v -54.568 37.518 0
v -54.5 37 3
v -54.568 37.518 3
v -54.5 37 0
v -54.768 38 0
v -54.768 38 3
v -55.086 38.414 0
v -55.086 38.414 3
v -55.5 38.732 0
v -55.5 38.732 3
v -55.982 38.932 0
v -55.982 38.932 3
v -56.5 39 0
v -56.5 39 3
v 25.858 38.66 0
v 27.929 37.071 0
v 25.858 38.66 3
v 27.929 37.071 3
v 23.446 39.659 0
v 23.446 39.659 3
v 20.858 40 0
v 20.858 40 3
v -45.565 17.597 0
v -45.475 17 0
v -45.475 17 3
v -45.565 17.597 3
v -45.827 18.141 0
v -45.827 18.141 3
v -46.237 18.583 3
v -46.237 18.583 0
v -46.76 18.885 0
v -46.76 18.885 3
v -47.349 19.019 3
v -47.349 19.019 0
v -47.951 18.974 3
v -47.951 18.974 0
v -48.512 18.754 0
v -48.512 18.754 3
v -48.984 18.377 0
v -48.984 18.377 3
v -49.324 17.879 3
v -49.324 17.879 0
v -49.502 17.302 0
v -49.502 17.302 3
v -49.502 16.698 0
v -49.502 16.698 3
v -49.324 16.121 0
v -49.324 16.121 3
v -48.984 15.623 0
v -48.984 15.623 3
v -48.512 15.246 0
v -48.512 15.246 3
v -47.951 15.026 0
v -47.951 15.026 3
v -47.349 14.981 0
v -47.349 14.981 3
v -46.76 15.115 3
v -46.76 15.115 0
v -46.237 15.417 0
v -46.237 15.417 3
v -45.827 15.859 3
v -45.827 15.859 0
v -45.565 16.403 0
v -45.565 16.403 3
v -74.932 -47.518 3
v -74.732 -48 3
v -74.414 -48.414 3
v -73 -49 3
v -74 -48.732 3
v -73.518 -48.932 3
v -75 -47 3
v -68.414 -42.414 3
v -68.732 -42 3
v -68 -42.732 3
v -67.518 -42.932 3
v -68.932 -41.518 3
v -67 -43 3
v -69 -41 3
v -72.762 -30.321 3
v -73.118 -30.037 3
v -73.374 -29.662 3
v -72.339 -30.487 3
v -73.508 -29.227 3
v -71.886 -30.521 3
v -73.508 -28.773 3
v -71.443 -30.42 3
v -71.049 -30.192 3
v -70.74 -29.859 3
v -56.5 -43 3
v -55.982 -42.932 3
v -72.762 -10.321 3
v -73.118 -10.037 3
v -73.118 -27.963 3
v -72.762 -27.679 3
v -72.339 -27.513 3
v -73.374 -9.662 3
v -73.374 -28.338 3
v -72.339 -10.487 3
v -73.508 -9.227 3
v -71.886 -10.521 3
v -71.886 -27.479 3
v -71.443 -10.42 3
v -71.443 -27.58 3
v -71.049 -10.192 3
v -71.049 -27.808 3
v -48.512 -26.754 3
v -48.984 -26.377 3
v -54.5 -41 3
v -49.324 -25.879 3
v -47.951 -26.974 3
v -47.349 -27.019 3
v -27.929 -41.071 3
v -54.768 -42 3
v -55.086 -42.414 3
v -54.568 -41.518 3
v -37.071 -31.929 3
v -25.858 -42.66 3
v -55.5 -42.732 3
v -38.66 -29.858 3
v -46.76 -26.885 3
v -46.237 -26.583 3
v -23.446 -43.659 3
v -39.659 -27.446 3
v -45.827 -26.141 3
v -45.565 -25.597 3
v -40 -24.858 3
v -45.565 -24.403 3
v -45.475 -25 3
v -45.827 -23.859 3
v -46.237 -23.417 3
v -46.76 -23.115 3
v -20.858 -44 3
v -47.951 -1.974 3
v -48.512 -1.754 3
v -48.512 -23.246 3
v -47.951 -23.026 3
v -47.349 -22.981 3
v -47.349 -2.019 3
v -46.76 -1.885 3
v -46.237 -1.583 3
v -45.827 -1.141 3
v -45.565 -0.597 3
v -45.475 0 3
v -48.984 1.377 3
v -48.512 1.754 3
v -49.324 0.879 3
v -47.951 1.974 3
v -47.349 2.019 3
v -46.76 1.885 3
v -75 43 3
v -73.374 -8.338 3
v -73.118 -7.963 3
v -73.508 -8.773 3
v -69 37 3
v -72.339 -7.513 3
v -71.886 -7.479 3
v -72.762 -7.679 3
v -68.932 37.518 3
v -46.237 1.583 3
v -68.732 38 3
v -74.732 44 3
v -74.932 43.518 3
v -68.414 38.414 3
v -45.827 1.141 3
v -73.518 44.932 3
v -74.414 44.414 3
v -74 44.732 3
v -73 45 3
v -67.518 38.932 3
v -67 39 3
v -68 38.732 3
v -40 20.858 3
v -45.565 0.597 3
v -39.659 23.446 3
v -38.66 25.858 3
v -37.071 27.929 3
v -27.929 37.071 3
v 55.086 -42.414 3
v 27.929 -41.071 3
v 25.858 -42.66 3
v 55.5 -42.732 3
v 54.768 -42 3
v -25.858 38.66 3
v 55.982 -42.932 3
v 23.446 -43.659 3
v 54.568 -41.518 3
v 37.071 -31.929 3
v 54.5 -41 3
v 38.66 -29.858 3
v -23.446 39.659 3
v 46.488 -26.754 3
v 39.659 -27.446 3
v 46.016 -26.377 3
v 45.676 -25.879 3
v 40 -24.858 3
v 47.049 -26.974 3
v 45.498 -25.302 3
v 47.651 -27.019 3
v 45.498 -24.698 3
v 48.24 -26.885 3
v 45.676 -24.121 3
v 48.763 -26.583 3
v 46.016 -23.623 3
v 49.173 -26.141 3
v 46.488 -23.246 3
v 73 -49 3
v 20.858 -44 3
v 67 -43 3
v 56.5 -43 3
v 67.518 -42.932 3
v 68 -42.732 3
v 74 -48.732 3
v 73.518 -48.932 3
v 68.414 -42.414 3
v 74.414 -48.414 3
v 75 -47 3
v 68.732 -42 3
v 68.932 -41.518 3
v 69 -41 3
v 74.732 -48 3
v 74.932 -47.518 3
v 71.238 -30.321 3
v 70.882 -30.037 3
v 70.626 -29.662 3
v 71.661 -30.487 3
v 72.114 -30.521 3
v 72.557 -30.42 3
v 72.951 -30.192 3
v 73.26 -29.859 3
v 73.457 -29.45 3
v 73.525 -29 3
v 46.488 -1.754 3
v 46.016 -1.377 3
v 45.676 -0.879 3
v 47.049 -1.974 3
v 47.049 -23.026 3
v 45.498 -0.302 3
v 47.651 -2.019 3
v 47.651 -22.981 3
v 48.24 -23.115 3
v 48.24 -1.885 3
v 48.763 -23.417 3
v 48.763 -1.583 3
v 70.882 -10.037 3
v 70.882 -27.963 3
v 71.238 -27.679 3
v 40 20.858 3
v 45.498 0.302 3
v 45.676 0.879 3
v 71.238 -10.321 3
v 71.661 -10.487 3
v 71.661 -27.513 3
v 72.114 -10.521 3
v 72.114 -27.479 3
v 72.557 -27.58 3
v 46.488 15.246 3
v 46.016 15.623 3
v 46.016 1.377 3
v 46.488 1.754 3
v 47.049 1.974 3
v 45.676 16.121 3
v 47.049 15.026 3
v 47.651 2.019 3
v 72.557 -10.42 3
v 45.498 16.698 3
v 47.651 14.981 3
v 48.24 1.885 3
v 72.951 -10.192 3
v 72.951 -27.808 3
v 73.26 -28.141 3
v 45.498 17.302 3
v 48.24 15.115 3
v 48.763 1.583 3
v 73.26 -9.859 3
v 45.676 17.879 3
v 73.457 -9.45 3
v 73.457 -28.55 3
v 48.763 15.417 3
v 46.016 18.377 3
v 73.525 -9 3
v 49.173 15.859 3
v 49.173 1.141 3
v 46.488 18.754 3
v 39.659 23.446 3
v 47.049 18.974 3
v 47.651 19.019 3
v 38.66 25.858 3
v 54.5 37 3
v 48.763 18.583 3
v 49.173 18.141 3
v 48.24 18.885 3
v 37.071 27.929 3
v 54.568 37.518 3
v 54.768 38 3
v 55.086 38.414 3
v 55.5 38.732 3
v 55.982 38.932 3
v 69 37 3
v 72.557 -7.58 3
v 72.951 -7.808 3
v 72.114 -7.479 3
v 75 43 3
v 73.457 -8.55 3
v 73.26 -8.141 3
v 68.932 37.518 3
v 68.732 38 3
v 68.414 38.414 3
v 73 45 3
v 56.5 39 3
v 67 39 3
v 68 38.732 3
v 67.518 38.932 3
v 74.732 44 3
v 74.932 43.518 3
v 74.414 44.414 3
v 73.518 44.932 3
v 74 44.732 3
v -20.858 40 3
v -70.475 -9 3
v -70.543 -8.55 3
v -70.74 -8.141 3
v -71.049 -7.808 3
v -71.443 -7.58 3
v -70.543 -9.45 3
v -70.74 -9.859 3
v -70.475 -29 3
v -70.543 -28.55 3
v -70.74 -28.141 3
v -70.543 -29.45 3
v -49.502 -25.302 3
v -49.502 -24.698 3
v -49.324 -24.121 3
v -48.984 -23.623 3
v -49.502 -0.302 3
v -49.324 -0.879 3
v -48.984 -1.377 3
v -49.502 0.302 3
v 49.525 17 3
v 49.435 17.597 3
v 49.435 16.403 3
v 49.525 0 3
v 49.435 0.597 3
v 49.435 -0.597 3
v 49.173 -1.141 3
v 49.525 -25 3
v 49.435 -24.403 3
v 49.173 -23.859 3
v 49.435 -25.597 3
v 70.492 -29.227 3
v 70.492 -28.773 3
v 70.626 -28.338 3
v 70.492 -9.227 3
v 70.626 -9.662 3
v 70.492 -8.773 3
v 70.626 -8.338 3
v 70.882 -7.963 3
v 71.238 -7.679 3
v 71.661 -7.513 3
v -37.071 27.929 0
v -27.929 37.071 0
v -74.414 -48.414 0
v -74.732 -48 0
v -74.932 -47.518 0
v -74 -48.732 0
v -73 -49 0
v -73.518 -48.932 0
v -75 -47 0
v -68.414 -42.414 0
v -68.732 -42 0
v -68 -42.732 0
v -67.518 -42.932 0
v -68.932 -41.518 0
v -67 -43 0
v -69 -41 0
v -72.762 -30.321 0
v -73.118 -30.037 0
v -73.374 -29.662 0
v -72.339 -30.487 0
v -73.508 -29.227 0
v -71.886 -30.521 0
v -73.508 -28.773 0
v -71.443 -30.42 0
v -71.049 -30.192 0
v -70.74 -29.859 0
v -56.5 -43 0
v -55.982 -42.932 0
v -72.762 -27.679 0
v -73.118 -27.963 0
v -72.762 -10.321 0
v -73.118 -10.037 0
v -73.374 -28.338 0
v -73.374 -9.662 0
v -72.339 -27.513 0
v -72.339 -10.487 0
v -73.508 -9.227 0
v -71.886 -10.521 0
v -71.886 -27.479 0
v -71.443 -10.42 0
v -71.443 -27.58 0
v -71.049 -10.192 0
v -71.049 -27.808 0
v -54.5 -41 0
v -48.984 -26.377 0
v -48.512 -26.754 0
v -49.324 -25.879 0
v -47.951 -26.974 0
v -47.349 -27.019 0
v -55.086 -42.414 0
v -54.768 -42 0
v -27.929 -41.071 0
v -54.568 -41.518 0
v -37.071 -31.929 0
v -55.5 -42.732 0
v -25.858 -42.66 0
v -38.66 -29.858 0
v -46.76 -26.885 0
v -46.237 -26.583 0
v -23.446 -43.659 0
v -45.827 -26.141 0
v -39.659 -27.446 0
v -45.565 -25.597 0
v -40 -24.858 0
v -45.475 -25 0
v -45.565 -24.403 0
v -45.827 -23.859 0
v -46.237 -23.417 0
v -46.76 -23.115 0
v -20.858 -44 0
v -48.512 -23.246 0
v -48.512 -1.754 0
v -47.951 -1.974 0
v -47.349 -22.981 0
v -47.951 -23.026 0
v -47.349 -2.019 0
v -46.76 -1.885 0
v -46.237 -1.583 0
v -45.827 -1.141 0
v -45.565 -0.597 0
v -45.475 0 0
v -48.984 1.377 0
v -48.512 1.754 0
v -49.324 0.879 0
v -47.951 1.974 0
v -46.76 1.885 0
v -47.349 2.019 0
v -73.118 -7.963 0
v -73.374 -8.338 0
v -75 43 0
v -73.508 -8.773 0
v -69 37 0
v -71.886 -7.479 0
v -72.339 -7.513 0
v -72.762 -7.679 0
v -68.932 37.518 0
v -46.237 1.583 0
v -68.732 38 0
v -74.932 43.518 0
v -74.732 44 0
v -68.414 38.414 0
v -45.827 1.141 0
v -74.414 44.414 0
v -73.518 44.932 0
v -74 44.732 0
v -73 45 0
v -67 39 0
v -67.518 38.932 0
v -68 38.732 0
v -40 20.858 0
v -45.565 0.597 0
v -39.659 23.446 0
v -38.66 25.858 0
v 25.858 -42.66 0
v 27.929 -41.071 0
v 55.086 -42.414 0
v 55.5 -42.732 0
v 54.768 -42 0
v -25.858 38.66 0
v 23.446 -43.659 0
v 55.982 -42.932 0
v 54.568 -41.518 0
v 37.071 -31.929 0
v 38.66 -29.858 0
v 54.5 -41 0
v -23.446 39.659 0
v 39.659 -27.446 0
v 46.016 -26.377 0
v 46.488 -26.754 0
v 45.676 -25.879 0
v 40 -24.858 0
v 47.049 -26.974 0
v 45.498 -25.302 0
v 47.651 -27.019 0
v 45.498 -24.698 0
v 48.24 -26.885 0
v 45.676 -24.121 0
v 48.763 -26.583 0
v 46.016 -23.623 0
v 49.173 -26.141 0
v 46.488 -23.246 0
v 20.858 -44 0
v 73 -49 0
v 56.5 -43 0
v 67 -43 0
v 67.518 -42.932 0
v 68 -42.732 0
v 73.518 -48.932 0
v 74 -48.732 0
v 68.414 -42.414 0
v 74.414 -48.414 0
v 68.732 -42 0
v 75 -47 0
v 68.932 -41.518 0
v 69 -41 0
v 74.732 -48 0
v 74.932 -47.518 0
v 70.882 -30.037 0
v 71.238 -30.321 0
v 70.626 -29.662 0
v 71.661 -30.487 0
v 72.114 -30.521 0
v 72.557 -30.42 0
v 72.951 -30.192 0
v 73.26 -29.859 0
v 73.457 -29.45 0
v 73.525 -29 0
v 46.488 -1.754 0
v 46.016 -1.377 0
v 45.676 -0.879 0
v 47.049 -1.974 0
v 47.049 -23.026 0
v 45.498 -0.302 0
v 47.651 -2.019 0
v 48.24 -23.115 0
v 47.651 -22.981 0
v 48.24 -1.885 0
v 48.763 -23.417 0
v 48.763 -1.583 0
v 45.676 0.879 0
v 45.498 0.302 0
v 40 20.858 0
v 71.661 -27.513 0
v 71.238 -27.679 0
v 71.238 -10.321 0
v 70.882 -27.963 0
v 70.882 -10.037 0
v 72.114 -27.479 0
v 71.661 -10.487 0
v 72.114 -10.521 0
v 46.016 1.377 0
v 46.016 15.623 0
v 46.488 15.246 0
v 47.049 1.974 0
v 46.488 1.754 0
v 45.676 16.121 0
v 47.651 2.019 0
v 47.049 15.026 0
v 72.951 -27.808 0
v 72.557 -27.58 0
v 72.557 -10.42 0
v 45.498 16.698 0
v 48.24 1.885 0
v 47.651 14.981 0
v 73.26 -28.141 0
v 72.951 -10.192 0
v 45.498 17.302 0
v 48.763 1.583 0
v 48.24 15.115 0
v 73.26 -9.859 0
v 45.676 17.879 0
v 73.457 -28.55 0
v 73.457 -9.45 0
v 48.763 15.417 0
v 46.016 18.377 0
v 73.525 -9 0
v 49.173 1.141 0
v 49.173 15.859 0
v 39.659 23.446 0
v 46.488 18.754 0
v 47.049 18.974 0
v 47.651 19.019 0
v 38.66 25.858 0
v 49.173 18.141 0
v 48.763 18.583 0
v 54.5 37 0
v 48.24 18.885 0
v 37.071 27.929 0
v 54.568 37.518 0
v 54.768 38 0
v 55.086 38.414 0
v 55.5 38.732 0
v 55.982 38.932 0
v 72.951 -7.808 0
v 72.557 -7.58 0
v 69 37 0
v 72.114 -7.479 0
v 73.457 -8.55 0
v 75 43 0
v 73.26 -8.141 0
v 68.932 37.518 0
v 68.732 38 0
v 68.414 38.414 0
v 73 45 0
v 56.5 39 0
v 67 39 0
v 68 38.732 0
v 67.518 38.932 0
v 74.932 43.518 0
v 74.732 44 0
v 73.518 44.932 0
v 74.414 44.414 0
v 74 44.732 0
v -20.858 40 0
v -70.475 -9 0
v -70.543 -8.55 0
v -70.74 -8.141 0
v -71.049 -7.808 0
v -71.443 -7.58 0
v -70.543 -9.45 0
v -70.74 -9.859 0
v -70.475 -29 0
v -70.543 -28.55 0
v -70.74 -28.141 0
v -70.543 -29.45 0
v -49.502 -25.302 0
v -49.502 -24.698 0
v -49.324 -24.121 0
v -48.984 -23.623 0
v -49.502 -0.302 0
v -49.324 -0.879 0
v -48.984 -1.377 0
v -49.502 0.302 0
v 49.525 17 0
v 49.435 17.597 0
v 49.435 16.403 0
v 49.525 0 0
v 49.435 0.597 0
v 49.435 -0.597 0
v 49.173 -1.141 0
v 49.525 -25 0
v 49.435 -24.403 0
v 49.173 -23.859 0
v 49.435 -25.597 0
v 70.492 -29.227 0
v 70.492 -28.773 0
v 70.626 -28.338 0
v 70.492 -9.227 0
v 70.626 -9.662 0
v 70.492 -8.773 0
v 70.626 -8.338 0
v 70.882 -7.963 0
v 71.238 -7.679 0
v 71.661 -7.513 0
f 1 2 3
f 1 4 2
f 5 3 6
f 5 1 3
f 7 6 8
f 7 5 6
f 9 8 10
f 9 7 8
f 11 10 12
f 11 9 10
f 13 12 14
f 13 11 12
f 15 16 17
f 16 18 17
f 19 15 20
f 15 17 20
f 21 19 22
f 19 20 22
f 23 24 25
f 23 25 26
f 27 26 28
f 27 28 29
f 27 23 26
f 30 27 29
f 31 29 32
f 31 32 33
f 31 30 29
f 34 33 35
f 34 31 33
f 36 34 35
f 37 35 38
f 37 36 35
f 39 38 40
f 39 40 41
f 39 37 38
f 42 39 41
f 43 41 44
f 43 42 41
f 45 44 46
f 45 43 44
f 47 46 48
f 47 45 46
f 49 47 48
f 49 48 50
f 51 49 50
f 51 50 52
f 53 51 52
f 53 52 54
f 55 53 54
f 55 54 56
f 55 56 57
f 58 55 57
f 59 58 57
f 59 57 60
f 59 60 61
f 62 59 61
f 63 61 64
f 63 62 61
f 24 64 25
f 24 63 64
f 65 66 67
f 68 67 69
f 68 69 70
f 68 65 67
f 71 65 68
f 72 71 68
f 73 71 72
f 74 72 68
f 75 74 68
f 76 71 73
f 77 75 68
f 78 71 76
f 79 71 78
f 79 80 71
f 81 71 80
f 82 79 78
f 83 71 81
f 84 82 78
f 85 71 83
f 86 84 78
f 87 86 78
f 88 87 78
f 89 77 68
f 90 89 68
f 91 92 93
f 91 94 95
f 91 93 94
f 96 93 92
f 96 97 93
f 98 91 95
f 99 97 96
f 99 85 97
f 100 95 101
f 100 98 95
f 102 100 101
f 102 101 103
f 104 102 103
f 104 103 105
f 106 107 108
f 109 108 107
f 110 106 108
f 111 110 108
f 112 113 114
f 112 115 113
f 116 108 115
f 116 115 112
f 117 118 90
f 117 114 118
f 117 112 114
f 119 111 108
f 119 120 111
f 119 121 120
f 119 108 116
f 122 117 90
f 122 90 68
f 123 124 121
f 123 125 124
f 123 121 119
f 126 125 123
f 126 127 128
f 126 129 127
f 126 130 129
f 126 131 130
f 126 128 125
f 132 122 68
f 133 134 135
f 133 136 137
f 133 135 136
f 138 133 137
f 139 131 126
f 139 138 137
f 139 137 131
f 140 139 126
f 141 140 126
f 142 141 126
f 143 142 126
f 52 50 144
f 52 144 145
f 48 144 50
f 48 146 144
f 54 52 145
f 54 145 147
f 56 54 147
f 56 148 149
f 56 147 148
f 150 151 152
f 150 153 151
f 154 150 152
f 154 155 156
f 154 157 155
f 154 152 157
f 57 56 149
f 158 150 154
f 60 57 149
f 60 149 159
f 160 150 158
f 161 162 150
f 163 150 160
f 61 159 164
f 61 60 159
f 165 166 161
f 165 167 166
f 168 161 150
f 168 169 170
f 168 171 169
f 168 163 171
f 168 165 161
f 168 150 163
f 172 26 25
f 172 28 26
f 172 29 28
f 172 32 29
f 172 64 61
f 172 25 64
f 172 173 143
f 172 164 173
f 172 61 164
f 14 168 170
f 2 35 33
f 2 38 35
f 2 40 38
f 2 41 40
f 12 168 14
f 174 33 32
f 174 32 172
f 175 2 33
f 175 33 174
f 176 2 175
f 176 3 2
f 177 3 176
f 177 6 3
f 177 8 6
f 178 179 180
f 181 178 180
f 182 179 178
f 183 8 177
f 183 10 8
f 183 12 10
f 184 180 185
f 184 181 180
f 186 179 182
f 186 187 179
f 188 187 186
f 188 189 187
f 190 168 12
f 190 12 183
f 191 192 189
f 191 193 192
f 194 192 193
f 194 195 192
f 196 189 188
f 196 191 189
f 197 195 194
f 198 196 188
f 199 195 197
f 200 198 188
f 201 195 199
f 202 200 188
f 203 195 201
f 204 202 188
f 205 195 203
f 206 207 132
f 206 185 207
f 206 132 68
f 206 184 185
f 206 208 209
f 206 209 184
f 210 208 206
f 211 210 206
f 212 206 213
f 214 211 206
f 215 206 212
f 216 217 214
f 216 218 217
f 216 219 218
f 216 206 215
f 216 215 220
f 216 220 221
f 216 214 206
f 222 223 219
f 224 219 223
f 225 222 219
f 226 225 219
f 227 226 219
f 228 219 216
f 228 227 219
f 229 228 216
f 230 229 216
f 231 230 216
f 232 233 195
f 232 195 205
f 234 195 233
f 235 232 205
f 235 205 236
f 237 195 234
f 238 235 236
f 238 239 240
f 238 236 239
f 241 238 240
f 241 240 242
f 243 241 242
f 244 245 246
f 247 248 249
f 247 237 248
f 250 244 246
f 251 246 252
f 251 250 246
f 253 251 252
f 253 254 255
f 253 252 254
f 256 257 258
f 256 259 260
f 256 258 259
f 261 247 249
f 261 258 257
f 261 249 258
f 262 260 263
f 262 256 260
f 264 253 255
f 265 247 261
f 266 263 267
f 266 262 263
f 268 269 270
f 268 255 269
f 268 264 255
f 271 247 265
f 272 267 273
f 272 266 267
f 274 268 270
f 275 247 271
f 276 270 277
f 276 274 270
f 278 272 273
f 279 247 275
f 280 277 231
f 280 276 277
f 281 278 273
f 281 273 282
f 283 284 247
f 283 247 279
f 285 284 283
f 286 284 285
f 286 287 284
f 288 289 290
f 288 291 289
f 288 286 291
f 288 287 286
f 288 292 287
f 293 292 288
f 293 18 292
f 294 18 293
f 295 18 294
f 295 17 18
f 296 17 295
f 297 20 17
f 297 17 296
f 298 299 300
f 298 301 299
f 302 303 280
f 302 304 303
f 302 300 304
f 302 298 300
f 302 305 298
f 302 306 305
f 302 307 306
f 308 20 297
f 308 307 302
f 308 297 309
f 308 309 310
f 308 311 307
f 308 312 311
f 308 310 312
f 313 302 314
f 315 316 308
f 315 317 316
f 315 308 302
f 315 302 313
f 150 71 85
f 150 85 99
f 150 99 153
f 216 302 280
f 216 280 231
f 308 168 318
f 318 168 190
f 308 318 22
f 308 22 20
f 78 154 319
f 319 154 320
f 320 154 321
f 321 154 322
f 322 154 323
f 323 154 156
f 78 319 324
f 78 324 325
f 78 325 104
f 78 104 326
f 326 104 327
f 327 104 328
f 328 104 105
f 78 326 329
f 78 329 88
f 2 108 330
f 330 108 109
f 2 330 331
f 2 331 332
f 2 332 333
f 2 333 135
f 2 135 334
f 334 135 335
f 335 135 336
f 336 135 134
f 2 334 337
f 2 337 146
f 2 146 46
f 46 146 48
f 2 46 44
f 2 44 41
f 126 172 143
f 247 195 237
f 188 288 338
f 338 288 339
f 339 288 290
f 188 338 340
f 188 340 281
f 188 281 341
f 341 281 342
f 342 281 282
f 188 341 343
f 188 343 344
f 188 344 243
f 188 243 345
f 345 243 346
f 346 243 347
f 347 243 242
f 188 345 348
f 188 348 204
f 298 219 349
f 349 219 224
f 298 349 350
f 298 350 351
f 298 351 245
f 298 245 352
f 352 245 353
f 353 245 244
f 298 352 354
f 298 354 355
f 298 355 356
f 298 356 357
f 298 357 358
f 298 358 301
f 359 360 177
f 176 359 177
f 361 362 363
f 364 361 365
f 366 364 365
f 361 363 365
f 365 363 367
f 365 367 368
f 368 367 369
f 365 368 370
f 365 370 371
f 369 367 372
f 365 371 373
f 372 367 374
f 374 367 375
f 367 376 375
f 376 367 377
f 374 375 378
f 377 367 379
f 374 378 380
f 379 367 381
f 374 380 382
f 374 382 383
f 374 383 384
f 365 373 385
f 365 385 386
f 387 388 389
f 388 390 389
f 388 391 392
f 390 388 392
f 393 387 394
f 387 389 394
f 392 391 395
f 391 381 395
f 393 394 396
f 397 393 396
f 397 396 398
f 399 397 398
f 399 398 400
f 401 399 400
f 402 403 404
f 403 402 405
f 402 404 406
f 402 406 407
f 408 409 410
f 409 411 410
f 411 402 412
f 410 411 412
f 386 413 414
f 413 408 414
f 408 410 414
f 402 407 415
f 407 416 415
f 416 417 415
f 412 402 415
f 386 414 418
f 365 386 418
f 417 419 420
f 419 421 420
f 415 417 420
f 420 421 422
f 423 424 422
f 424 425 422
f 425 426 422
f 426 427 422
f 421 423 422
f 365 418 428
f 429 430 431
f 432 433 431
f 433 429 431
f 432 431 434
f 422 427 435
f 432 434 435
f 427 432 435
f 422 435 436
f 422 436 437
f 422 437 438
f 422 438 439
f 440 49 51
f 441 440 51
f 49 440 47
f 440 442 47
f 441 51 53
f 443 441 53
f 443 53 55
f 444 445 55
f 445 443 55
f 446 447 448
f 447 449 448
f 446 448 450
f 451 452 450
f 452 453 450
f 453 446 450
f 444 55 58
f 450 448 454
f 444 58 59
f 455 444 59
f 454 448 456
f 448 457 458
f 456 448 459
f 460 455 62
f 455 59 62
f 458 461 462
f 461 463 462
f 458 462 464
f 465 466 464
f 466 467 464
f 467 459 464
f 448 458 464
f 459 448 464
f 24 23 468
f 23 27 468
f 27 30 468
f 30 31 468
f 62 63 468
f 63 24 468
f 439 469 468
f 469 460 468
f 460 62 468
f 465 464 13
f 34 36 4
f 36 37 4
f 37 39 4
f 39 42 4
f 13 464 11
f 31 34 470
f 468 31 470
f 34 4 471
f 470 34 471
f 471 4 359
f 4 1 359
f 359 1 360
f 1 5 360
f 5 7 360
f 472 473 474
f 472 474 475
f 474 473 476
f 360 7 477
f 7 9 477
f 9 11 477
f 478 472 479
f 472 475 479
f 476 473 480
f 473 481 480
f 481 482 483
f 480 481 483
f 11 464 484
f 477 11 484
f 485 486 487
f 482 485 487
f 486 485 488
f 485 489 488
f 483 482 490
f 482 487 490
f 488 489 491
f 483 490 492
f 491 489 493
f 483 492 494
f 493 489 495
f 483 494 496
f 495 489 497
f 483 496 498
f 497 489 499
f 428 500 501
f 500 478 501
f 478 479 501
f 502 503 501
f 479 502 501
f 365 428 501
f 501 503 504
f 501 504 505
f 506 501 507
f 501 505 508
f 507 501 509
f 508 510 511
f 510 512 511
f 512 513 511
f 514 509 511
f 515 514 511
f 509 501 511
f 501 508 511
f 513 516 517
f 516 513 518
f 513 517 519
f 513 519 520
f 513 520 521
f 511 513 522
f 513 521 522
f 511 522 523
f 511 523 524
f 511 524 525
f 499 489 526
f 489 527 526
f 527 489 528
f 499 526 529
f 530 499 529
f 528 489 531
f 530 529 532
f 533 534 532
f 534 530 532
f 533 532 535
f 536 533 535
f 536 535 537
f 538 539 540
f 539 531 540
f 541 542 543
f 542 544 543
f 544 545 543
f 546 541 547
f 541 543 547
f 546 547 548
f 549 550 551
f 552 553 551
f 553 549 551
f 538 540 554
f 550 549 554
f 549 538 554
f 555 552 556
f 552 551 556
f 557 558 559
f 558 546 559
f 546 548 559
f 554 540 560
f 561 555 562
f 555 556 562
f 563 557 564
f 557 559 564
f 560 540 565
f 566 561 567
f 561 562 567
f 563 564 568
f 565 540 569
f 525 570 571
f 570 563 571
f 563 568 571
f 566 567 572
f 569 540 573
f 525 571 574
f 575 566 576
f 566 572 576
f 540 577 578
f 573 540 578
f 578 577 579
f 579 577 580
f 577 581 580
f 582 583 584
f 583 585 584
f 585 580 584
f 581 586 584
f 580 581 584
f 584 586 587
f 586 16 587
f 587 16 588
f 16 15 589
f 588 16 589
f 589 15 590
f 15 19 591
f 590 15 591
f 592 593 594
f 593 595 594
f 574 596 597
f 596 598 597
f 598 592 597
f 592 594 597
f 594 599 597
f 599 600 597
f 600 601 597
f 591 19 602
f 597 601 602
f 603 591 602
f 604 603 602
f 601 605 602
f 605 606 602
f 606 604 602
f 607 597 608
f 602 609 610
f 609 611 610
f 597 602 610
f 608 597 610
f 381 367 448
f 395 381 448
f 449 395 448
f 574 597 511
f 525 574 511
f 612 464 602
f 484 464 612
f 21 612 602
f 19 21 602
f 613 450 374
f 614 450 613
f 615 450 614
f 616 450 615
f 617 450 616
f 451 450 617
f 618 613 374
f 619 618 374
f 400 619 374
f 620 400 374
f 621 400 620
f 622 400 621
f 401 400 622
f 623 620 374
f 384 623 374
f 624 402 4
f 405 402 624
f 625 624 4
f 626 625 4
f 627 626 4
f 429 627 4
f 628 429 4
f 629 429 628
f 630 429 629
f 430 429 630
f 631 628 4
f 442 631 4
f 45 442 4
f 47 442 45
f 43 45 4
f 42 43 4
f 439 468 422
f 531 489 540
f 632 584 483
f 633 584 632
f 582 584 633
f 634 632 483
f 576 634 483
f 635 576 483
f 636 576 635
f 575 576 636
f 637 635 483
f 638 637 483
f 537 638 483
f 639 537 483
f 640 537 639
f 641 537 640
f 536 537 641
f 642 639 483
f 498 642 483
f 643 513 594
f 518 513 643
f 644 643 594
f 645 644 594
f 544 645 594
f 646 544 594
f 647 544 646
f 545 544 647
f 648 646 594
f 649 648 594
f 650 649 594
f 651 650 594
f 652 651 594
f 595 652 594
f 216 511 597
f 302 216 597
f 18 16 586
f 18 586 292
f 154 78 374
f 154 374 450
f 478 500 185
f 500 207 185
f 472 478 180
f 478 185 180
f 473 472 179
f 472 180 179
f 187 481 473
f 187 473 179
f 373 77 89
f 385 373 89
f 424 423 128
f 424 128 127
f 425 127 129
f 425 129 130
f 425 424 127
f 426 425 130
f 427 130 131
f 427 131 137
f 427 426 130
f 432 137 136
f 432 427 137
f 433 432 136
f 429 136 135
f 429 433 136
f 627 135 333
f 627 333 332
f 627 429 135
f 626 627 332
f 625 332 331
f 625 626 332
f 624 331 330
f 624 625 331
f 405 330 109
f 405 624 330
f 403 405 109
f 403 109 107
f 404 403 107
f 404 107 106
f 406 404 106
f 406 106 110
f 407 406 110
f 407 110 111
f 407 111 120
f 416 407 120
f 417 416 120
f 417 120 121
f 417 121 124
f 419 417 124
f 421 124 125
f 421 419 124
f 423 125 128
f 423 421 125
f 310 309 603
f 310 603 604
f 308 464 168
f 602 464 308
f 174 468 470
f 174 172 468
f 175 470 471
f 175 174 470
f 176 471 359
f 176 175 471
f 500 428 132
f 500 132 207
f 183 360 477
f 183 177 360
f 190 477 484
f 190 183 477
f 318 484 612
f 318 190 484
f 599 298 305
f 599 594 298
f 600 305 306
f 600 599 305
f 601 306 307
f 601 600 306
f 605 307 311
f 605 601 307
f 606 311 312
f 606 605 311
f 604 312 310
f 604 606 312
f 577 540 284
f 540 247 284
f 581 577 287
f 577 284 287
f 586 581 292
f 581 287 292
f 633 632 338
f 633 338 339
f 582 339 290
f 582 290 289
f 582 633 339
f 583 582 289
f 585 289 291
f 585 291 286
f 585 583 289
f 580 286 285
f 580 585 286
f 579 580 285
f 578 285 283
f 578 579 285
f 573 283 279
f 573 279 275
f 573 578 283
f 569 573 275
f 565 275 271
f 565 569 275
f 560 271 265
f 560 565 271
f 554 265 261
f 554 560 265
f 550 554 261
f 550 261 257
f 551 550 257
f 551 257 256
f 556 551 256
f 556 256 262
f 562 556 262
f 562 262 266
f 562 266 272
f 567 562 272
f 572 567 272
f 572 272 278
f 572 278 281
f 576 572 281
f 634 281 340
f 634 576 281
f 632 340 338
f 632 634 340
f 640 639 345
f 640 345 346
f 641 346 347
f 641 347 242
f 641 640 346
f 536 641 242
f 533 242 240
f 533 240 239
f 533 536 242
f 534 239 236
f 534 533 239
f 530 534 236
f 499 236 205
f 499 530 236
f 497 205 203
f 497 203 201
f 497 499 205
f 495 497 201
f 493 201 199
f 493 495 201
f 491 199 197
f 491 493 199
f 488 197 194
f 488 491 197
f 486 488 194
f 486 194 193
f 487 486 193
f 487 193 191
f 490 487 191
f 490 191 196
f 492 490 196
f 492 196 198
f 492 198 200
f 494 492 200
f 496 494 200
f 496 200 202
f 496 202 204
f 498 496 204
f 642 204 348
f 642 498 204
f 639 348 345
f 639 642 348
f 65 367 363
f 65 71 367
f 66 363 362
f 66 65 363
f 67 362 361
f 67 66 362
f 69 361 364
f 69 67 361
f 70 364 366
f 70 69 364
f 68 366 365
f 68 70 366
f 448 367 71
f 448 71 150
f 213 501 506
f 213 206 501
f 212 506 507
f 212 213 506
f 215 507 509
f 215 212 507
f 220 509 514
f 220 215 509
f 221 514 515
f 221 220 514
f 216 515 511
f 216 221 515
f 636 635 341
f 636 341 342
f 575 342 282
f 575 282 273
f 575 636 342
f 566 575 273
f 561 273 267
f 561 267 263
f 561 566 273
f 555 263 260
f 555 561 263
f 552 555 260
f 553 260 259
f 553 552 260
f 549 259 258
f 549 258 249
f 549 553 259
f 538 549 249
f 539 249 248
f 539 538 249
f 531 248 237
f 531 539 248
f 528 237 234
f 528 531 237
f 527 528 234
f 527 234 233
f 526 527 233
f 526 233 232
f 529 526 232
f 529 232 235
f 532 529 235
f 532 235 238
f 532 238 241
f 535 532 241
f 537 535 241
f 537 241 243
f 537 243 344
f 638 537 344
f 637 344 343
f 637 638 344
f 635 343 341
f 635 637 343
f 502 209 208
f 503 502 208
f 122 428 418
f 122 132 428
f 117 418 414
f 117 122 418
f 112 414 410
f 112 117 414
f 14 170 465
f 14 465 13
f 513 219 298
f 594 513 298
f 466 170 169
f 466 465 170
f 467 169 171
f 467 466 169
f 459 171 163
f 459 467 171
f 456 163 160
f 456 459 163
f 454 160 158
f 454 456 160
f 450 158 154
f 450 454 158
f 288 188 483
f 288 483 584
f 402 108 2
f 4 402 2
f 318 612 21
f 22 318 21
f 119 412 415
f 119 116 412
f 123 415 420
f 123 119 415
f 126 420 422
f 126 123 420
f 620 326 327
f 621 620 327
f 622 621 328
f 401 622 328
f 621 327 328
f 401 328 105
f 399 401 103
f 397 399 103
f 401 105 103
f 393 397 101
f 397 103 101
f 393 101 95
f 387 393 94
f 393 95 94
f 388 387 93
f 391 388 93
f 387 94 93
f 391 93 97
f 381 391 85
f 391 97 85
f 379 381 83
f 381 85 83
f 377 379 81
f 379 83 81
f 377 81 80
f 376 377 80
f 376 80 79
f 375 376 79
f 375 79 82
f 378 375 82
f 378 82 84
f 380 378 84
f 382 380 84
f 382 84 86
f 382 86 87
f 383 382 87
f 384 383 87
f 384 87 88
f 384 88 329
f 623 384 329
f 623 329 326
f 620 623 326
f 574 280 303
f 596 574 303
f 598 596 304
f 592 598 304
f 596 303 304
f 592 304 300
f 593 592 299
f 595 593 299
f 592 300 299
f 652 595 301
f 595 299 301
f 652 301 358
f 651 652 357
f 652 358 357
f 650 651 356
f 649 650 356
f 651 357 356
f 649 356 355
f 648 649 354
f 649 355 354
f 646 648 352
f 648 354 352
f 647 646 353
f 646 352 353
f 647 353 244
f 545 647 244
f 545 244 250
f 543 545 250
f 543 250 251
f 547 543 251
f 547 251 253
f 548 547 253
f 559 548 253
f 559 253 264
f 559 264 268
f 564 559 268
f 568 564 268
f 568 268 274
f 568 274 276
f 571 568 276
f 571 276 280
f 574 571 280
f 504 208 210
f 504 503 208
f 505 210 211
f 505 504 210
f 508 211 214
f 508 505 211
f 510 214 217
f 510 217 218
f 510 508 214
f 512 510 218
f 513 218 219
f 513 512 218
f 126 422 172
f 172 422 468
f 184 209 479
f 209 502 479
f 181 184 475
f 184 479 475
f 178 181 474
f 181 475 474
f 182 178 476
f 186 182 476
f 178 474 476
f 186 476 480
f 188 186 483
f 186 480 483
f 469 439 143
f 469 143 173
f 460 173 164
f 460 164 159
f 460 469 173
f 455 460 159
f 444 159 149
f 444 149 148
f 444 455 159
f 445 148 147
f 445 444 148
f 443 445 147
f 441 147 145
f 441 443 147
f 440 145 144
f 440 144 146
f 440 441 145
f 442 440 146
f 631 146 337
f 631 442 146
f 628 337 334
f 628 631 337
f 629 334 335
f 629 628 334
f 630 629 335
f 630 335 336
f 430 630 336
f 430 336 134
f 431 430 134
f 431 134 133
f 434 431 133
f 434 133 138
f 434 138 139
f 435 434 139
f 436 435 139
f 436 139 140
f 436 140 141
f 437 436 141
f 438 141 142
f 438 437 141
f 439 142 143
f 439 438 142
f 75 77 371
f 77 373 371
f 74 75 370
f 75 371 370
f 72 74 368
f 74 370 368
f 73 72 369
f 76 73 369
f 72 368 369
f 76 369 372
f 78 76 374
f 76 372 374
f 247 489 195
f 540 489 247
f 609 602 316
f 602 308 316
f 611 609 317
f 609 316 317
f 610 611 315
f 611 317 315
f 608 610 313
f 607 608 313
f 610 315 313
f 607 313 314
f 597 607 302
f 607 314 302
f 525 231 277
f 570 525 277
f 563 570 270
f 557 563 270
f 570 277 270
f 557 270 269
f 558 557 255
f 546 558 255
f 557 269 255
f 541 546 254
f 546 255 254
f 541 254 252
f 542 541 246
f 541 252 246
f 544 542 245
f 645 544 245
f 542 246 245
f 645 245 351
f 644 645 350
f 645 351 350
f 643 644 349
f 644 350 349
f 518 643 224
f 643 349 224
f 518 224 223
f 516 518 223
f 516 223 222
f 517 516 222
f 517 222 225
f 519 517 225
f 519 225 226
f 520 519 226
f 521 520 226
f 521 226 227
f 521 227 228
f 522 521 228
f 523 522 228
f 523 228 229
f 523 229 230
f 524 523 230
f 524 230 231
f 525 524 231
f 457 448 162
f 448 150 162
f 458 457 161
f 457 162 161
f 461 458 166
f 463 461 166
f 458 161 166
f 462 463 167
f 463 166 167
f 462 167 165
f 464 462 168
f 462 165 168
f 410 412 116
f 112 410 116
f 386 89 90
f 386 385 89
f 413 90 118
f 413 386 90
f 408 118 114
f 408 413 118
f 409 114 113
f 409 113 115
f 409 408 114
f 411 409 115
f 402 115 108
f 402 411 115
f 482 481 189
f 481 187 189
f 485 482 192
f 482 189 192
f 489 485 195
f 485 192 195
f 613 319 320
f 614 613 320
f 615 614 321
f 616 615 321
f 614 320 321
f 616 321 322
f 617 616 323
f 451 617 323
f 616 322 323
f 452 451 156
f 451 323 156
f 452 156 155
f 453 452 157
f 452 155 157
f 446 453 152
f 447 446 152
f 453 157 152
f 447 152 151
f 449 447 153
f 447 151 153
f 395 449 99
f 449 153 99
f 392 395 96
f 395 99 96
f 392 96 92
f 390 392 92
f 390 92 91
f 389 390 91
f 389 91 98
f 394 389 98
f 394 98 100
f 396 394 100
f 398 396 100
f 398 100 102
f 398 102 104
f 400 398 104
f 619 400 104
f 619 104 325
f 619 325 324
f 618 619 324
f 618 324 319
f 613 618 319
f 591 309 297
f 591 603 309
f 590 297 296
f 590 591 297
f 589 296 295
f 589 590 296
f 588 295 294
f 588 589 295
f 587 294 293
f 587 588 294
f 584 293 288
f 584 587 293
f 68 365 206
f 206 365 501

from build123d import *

# Parameters (mm, degrees)
SKETCH_1_W          = 150
SKETCH_1_H          = 94
SKETCH_1_R          = 2.025
SKETCH_1_W_2        = 80
SKETCH_1_H_2        = 84
EXTRUDE_1_DEPTH     = 3
CHAMFER_1_SIZE      = 15
FILLET_1_R          = 10
SKETCH_2_W          = 14.5
SKETCH_2_H          = 82
CUT_EXTRUDE_1_DEPTH = 10
FILLET_2_R          = 2
SKETCH_3_R          = 1.525
CUT_EXTRUDE_2_DEPTH = 10


with BuildPart() as part:
    # 草图1 → 凸台-拉伸1 (new body)
    with BuildSketch(Plane.XY):
        with Locations((0, -2)):
            Rectangle(SKETCH_1_W, SKETCH_1_H)
        with Locations((-47.5, 0)):
            Circle(SKETCH_1_R, mode=Mode.SUBTRACT)
        with Locations((-47.5, 17)):
            Circle(SKETCH_1_R, mode=Mode.SUBTRACT)
        with Locations((-47.5, -25)):
            Circle(SKETCH_1_R, mode=Mode.SUBTRACT)
        with Locations((47.5, -25)):
            Circle(SKETCH_1_R, mode=Mode.SUBTRACT)
        with Locations((47.5, 17)):
            Circle(SKETCH_1_R, mode=Mode.SUBTRACT)
        with Locations((47.5, 0)):
            Circle(SKETCH_1_R, mode=Mode.SUBTRACT)
        with Locations((0, -2)):
            Rectangle(SKETCH_1_W_2, SKETCH_1_H_2, mode=Mode.SUBTRACT)
    extrude(amount=EXTRUDE_1_DEPTH)

    # 倒角1
    chamfer_1_edges = [part.edges().sort_by_distance(p)[0] for p in [
        (40, -44, 1.5),
        (40, 40, 1.5),
        (-40, 40, 1.5),
        (-40, -44, 1.5),
    ]]
    chamfer(chamfer_1_edges, length=CHAMFER_1_SIZE)

    # 圆角1
    fillet_1_edges = [part.edges().sort_by_distance(p)[0] for p in [
        (-25, -44, 1.5),
        (25, -44, 1.5),
        (40, 25, 1.5),
        (40, -29, 1.5),
        (-25, 40, 1.5),
        (25, 40, 1.5),
        (-40, -29, 1.5),
        (-40, 25, 1.5),
    ]]
    fillet(fillet_1_edges, radius=FILLET_1_R)

    # 草图2 → 切除-拉伸1 (cut)
    with BuildSketch(Plane.XY.offset(3)):
        with Locations((-61.75, -2)):
            Rectangle(SKETCH_2_W, SKETCH_2_H)
        with Locations((61.75, -2)):
            Rectangle(SKETCH_2_W, SKETCH_2_H)
    extrude(amount=-CUT_EXTRUDE_1_DEPTH, mode=Mode.SUBTRACT)

    # 圆角2
    fillet_2_edges = [part.edges().sort_by_distance(p)[0] for p in [
        (-69, -43, 1.5),
        (-69, 39, 1.5),
        (-54.5, 39, 1.5),
        (-54.5, -43, 1.5),
        (69, 39, 1.5),
        (69, -43, 1.5),
        (54.5, -43, 1.5),
        (54.5, 39, 1.5),
        (-75, 45, 1.5),
        (75, 45, 1.5),
        (75, -49, 1.5),
        (-75, -49, 1.5),
    ]]
    fillet(fillet_2_edges, radius=FILLET_2_R)

    # 草图3 → 切除-拉伸2 (cut)
    with BuildSketch(Plane.XY.offset(3)):
        with Locations((72, -9)):
            Circle(SKETCH_3_R)
        with Locations((72, -29)):
            Circle(SKETCH_3_R)
        with Locations((-72, -29)):
            Circle(SKETCH_3_R)
        with Locations((-72, -9)):
            Circle(SKETCH_3_R)
    extrude(amount=-CUT_EXTRUDE_2_DEPTH, mode=Mode.SUBTRACT)


solid = part.part
